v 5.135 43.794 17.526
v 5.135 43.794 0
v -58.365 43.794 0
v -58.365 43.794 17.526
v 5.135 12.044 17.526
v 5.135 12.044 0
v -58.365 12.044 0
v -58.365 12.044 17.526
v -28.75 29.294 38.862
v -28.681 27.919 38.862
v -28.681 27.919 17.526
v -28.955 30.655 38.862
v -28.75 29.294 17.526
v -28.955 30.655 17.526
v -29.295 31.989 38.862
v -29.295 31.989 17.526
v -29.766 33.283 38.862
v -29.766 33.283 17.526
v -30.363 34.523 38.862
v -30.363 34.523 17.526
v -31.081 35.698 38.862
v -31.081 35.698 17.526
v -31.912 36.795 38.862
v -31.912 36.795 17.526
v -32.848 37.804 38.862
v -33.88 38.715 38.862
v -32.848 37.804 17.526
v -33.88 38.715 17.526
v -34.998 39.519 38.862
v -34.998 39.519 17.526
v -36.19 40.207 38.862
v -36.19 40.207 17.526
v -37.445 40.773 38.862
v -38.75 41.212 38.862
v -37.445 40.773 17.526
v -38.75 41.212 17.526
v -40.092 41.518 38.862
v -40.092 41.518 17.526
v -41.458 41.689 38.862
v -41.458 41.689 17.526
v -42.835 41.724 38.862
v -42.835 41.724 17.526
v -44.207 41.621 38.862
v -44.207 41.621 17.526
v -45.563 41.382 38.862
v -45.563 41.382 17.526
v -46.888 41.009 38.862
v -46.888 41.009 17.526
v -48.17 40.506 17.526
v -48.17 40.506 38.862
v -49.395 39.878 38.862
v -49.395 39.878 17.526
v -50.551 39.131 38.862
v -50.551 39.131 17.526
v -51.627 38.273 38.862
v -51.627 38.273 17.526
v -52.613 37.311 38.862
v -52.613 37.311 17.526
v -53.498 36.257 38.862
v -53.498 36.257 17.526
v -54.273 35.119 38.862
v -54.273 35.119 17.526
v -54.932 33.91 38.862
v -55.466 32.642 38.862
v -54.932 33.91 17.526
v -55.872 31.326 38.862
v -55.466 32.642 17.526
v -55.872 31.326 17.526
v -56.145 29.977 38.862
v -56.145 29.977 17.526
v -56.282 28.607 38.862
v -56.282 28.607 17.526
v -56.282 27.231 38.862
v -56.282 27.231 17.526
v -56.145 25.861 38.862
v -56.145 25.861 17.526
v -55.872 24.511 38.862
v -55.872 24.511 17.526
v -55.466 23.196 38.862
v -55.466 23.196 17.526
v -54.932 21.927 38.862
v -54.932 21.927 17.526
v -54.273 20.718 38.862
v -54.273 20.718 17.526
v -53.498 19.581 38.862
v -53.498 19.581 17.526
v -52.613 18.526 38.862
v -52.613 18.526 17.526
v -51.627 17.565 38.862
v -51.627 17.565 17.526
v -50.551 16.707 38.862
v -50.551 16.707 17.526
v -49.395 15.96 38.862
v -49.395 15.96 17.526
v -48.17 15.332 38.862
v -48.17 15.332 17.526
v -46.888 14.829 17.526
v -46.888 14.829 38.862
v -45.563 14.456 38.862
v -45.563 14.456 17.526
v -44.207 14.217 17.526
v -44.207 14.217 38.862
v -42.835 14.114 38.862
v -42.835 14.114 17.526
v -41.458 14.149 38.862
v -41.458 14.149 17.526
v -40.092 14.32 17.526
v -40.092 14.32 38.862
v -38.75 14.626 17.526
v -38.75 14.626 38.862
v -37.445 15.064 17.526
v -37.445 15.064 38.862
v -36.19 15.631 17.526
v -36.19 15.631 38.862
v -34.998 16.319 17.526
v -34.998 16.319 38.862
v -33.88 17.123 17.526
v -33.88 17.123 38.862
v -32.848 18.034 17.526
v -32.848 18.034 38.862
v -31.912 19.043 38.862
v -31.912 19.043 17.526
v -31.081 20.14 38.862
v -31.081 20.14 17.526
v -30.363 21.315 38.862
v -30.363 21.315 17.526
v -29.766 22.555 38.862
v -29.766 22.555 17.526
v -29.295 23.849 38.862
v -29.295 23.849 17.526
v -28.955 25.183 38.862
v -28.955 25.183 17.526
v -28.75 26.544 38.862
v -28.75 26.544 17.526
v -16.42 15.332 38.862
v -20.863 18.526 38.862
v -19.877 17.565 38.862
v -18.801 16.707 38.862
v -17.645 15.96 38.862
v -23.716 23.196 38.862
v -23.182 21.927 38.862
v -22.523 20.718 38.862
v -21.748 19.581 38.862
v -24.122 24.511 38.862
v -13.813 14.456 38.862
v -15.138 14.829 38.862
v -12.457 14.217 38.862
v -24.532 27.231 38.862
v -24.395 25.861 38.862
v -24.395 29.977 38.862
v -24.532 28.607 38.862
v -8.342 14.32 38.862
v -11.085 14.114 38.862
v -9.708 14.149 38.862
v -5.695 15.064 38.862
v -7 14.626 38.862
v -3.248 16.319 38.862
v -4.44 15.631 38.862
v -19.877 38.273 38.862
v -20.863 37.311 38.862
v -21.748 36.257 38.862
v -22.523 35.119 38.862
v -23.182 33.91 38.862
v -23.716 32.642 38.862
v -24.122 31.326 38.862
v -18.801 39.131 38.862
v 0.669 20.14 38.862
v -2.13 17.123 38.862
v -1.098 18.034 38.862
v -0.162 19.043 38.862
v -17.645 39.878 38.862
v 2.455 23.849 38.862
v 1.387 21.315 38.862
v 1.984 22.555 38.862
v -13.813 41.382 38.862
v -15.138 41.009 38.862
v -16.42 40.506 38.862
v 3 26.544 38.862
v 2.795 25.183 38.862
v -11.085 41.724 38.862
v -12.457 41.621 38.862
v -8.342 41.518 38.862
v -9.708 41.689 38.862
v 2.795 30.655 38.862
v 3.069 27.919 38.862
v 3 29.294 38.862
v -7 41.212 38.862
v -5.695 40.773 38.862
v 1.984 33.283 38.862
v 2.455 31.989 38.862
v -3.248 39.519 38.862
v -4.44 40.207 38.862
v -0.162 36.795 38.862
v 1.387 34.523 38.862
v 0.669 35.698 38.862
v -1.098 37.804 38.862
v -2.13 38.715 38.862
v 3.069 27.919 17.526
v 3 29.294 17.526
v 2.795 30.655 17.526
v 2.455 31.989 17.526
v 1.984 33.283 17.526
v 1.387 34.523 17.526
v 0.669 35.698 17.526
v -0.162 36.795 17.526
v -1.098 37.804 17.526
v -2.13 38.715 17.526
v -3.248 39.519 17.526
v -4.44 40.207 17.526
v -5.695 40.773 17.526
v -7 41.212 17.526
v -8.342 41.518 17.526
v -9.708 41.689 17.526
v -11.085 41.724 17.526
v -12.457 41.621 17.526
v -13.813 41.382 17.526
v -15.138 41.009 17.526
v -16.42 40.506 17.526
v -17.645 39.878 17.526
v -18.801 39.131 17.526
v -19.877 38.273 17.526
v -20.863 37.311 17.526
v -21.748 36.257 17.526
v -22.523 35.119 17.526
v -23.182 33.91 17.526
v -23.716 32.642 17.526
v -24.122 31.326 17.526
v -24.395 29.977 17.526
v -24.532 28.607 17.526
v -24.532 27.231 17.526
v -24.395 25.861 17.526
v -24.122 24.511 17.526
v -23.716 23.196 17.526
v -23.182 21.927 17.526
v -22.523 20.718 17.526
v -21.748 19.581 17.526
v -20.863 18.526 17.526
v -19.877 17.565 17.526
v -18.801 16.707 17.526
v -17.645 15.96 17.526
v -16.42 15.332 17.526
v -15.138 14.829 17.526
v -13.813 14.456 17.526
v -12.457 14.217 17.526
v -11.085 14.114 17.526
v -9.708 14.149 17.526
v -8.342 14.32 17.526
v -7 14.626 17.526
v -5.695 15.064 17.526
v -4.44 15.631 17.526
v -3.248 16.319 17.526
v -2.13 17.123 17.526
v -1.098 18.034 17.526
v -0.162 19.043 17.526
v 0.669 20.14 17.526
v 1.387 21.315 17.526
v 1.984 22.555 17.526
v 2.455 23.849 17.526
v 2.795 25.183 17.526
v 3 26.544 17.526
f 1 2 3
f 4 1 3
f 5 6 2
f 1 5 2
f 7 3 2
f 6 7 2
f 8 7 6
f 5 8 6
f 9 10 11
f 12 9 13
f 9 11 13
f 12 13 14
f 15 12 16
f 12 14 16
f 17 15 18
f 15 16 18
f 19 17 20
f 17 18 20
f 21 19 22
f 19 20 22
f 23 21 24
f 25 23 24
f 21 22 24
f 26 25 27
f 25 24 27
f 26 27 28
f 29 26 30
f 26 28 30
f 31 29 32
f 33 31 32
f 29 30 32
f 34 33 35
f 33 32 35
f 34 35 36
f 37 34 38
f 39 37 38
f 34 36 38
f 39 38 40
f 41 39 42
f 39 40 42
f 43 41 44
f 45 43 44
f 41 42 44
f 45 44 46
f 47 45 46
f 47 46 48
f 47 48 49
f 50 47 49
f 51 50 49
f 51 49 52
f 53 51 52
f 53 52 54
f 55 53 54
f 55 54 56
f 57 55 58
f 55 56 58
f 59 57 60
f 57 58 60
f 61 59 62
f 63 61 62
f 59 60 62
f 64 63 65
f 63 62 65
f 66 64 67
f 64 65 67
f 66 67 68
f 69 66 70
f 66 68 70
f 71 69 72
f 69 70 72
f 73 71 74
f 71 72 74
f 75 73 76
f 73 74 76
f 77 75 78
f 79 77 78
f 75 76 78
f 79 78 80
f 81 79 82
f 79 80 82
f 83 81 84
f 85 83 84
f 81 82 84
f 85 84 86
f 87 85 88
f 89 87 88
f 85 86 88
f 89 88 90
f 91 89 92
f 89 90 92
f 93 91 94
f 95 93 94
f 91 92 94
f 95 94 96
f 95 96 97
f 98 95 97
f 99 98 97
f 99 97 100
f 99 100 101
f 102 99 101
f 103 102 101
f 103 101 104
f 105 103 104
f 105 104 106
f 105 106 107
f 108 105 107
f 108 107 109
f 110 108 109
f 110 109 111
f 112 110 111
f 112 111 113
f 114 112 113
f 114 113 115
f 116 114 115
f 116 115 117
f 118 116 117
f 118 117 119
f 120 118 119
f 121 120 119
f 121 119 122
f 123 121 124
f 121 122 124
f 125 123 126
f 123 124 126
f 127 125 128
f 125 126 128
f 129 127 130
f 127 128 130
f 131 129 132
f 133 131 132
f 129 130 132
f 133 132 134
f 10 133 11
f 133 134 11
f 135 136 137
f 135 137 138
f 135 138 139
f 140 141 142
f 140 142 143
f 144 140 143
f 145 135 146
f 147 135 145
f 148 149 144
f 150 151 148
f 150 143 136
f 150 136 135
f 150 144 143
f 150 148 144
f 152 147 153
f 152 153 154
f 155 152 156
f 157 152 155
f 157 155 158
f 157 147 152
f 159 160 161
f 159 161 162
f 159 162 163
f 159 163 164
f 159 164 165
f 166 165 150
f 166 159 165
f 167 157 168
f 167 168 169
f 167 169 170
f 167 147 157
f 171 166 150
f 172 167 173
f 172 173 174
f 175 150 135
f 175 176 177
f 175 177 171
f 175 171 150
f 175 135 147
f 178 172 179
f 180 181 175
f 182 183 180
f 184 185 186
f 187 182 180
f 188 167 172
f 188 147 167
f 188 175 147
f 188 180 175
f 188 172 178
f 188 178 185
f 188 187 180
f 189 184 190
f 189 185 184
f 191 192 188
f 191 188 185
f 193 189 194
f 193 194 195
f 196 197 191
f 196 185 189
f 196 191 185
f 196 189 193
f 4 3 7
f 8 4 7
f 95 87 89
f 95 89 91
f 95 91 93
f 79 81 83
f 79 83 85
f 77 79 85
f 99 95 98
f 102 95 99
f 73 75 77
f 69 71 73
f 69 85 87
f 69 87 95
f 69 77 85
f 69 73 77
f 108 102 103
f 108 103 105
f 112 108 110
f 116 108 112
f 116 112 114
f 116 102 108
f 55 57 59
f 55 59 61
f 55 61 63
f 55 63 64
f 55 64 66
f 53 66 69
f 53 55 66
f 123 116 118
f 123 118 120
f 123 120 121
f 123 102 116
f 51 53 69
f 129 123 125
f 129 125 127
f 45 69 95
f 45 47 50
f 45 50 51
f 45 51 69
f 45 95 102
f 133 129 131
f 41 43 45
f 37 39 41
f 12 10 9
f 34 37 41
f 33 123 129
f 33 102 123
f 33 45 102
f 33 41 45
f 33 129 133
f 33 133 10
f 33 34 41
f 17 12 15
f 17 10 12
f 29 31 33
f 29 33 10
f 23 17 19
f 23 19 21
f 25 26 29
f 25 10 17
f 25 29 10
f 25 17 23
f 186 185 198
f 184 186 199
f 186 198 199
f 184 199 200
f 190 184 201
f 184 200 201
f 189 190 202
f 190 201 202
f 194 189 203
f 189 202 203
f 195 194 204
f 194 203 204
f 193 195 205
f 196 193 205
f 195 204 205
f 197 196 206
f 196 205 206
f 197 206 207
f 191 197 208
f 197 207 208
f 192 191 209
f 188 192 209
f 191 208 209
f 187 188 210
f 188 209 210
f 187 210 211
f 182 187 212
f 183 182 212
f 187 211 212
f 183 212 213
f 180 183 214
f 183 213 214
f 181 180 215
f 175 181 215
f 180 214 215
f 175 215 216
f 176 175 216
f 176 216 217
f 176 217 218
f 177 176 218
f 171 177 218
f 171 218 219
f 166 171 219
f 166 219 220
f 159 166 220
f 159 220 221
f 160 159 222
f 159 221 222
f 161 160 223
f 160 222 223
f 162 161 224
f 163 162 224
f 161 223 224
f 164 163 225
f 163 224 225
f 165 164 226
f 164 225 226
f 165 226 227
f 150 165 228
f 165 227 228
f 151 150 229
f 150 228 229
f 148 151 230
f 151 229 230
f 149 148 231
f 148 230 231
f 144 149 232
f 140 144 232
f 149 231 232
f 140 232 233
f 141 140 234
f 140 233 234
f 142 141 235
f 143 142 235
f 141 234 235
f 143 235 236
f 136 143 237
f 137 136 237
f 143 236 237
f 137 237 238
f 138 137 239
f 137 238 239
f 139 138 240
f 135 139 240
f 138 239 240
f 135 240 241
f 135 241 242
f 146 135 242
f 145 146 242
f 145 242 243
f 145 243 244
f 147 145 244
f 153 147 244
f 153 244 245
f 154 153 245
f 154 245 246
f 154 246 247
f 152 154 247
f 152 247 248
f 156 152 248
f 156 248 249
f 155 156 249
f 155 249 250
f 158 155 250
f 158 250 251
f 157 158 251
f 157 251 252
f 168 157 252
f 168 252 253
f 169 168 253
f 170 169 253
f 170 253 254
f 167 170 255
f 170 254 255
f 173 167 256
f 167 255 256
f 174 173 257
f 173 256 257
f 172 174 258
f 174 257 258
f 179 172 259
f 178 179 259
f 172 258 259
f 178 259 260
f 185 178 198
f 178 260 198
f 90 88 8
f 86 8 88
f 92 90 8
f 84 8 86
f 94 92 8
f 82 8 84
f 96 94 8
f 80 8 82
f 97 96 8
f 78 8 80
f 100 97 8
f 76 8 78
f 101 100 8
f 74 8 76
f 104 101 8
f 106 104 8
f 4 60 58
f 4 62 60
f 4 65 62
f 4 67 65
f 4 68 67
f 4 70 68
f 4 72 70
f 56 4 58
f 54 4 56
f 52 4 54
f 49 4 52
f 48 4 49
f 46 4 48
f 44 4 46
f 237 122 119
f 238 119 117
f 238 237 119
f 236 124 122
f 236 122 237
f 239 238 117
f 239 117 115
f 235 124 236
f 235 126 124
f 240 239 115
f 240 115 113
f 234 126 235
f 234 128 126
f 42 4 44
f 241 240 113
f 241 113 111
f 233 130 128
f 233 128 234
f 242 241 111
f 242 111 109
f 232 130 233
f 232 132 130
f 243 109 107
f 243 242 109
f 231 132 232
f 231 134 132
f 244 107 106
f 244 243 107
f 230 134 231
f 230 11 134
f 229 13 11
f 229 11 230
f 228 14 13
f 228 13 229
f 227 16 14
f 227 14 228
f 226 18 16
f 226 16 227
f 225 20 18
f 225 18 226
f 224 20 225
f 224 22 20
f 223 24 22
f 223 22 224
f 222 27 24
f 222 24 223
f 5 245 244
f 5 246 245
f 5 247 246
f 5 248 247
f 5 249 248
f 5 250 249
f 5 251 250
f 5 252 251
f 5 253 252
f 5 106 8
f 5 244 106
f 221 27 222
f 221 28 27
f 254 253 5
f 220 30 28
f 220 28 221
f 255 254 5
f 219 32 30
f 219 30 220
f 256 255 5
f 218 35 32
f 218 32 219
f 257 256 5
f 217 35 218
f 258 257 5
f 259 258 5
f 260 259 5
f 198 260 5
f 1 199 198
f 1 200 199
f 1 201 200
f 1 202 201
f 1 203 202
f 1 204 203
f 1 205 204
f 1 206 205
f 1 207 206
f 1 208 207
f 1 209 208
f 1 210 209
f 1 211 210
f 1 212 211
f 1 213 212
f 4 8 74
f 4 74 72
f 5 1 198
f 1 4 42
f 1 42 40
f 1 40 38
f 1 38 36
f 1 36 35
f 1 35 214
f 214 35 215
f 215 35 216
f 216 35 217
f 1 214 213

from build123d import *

# Parameters (mm, degrees)
F1_DEPTH = 17.526
F2_R     = 13.808948
F3_DEPTH = 21.336


with BuildPart() as f1:
    # F0 (on Top) → F1 (new body)
    with BuildSketch(Plane.XY):
        Polygon((-50.618237, 43.793876), (-58.365237, 43.793876), (-58.365237, 36.300876), (-57.095237, 36.300876), (-57.095237, 36.173876), (-57.095237, 36.046876), (-58.365237, 36.046876), (-58.365237, 20.044876), (-57.095237, 20.044876), (-57.095237, 19.917876), (-57.095237, 19.790876), (-58.365237, 19.790876), (-58.365237, 12.043876), (-50.618237, 12.043876), (-50.618237, 18.393876), (-50.491237, 18.393876), (-50.364237, 18.393876), (-50.364237, 12.043876), (-33.346237, 12.043876), (-33.346237, 18.393876), (-33.219237, 18.393876), (-33.092237, 18.393876), (-33.092237, 12.043876), (-26.615237, 12.043876), (-26.615237, 19.790876), (-27.885237, 19.790876), (-27.885237, 19.917876), (-27.885237, 20.044876), (-26.615237, 20.044876), (-26.615237, 36.046876), (-27.885237, 36.046876), (-27.885237, 36.173876), (-27.885237, 36.300876), (-26.615237, 36.300876), (-26.615237, 43.793876), (-33.092237, 43.793876), (-33.092237, 37.443876), (-33.219237, 37.443876), (-33.346237, 37.443876), (-33.346237, 43.793876), (-50.364237, 43.793876), (-50.364237, 37.443876), (-50.491237, 37.443876), (-50.618237, 37.443876), align=None)
        Polygon((-50.364237, 43.793876), (-50.618237, 43.793876), (-50.618237, 37.443876), (-50.491237, 37.443876), (-50.364237, 37.443876), align=None)
        Polygon((-57.095237, 36.300876), (-58.365237, 36.300876), (-58.365237, 36.173876), (-58.365237, 36.046876), (-57.095237, 36.046876), (-57.095237, 36.173876), align=None)
        Polygon((-33.092237, 43.793876), (-33.346237, 43.793876), (-33.346237, 37.443876), (-33.219237, 37.443876), (-33.092237, 37.443876), align=None)
        Polygon((-57.095237, 20.044876), (-58.365237, 20.044876), (-58.365237, 19.917876), (-58.365237, 19.790876), (-57.095237, 19.790876), (-57.095237, 19.917876), align=None)
        Polygon((-20.138237, 43.793876), (-26.615237, 43.793876), (-26.615237, 36.300876), (-25.345237, 36.300876), (-25.345237, 36.173876), (-25.345237, 36.046876), (-26.615237, 36.046876), (-26.615237, 20.044876), (-25.345237, 20.044876), (-25.345237, 19.917876), (-25.345237, 19.790876), (-26.615237, 19.790876), (-26.615237, 12.043876), (-20.138237, 12.043876), (-20.138237, 18.393876), (-20.011237, 18.393876), (-19.884237, 18.393876), (-19.884237, 12.043876), (-2.866237, 12.043876), (-2.866237, 18.393876), (-2.739237, 18.393876), (-2.612237, 18.393876), (-2.612237, 12.043876), (5.134763, 12.043876), (5.134763, 19.790876), (3.864763, 19.790876), (3.864763, 19.917876), (3.864763, 20.044876), (5.134763, 20.044876), (5.134763, 36.046876), (3.864763, 36.046876), (3.864763, 36.173876), (3.864763, 36.300876), (5.134763, 36.300876), (5.134763, 43.793876), (-2.612237, 43.793876), (-2.612237, 37.443876), (-2.739237, 37.443876), (-2.866237, 37.443876), (-2.866237, 43.793876), (-19.884237, 43.793876), (-19.884237, 37.443876), (-20.011237, 37.443876), (-20.138237, 37.443876), align=None)
        Polygon((-19.884237, 43.793876), (-20.138237, 43.793876), (-20.138237, 37.443876), (-20.011237, 37.443876), (-19.884237, 37.443876), align=None)
        Polygon((-2.612237, 43.793876), (-2.866237, 43.793876), (-2.866237, 37.443876), (-2.739237, 37.443876), (-2.612237, 37.443876), align=None)
        Polygon((-50.618237, 18.393876), (-50.618237, 12.043876), (-50.491237, 12.043876), (-50.364237, 12.043876), (-50.364237, 18.393876), (-50.491237, 18.393876), align=None)
        Polygon((5.134763, 36.046876), (5.134763, 36.300876), (3.864763, 36.300876), (3.864763, 36.173876), (3.864763, 36.046876), align=None)
        Polygon((-33.219237, 12.043876), (-33.092237, 12.043876), (-33.092237, 18.393876), (-33.219237, 18.393876), (-33.346237, 18.393876), (-33.346237, 12.043876), align=None)
        Polygon((-20.138237, 18.393876), (-20.138237, 12.043876), (-19.884237, 12.043876), (-19.884237, 18.393876), (-20.011237, 18.393876), align=None)
        Polygon((5.134763, 19.790876), (5.134763, 20.044876), (3.864763, 20.044876), (3.864763, 19.917876), (3.864763, 19.790876), align=None)
        Polygon((-2.866237, 18.393876), (-2.866237, 12.043876), (-2.612237, 12.043876), (-2.612237, 18.393876), (-2.739237, 18.393876), align=None)
        Polygon((-26.615237, 36.046876), (-26.615237, 36.300876), (-27.885237, 36.300876), (-27.885237, 36.173876), (-27.885237, 36.046876), align=None)
        Polygon((-25.345237, 36.300876), (-26.615237, 36.300876), (-26.615237, 36.046876), (-25.345237, 36.046876), (-25.345237, 36.173876), align=None)
        Polygon((-25.345237, 20.044876), (-26.615237, 20.044876), (-26.615237, 19.790876), (-25.345237, 19.790876), (-25.345237, 19.917876), align=None)
        Polygon((-26.615237, 19.790876), (-26.615237, 20.044876), (-27.885237, 20.044876), (-27.885237, 19.917876), (-27.885237, 19.790876), align=None)
    extrude(amount=F1_DEPTH)

    # F2 (on face) → F3 (join)
    with BuildSketch(Plane.XY.offset(17.526)):
        with Locations((-42.490237, 27.918876)):
            Circle(F2_R)
        with Locations((-10.740237, 27.918876)):
            Circle(F2_R)
    extrude(amount=F3_DEPTH)


solid = f1.part
